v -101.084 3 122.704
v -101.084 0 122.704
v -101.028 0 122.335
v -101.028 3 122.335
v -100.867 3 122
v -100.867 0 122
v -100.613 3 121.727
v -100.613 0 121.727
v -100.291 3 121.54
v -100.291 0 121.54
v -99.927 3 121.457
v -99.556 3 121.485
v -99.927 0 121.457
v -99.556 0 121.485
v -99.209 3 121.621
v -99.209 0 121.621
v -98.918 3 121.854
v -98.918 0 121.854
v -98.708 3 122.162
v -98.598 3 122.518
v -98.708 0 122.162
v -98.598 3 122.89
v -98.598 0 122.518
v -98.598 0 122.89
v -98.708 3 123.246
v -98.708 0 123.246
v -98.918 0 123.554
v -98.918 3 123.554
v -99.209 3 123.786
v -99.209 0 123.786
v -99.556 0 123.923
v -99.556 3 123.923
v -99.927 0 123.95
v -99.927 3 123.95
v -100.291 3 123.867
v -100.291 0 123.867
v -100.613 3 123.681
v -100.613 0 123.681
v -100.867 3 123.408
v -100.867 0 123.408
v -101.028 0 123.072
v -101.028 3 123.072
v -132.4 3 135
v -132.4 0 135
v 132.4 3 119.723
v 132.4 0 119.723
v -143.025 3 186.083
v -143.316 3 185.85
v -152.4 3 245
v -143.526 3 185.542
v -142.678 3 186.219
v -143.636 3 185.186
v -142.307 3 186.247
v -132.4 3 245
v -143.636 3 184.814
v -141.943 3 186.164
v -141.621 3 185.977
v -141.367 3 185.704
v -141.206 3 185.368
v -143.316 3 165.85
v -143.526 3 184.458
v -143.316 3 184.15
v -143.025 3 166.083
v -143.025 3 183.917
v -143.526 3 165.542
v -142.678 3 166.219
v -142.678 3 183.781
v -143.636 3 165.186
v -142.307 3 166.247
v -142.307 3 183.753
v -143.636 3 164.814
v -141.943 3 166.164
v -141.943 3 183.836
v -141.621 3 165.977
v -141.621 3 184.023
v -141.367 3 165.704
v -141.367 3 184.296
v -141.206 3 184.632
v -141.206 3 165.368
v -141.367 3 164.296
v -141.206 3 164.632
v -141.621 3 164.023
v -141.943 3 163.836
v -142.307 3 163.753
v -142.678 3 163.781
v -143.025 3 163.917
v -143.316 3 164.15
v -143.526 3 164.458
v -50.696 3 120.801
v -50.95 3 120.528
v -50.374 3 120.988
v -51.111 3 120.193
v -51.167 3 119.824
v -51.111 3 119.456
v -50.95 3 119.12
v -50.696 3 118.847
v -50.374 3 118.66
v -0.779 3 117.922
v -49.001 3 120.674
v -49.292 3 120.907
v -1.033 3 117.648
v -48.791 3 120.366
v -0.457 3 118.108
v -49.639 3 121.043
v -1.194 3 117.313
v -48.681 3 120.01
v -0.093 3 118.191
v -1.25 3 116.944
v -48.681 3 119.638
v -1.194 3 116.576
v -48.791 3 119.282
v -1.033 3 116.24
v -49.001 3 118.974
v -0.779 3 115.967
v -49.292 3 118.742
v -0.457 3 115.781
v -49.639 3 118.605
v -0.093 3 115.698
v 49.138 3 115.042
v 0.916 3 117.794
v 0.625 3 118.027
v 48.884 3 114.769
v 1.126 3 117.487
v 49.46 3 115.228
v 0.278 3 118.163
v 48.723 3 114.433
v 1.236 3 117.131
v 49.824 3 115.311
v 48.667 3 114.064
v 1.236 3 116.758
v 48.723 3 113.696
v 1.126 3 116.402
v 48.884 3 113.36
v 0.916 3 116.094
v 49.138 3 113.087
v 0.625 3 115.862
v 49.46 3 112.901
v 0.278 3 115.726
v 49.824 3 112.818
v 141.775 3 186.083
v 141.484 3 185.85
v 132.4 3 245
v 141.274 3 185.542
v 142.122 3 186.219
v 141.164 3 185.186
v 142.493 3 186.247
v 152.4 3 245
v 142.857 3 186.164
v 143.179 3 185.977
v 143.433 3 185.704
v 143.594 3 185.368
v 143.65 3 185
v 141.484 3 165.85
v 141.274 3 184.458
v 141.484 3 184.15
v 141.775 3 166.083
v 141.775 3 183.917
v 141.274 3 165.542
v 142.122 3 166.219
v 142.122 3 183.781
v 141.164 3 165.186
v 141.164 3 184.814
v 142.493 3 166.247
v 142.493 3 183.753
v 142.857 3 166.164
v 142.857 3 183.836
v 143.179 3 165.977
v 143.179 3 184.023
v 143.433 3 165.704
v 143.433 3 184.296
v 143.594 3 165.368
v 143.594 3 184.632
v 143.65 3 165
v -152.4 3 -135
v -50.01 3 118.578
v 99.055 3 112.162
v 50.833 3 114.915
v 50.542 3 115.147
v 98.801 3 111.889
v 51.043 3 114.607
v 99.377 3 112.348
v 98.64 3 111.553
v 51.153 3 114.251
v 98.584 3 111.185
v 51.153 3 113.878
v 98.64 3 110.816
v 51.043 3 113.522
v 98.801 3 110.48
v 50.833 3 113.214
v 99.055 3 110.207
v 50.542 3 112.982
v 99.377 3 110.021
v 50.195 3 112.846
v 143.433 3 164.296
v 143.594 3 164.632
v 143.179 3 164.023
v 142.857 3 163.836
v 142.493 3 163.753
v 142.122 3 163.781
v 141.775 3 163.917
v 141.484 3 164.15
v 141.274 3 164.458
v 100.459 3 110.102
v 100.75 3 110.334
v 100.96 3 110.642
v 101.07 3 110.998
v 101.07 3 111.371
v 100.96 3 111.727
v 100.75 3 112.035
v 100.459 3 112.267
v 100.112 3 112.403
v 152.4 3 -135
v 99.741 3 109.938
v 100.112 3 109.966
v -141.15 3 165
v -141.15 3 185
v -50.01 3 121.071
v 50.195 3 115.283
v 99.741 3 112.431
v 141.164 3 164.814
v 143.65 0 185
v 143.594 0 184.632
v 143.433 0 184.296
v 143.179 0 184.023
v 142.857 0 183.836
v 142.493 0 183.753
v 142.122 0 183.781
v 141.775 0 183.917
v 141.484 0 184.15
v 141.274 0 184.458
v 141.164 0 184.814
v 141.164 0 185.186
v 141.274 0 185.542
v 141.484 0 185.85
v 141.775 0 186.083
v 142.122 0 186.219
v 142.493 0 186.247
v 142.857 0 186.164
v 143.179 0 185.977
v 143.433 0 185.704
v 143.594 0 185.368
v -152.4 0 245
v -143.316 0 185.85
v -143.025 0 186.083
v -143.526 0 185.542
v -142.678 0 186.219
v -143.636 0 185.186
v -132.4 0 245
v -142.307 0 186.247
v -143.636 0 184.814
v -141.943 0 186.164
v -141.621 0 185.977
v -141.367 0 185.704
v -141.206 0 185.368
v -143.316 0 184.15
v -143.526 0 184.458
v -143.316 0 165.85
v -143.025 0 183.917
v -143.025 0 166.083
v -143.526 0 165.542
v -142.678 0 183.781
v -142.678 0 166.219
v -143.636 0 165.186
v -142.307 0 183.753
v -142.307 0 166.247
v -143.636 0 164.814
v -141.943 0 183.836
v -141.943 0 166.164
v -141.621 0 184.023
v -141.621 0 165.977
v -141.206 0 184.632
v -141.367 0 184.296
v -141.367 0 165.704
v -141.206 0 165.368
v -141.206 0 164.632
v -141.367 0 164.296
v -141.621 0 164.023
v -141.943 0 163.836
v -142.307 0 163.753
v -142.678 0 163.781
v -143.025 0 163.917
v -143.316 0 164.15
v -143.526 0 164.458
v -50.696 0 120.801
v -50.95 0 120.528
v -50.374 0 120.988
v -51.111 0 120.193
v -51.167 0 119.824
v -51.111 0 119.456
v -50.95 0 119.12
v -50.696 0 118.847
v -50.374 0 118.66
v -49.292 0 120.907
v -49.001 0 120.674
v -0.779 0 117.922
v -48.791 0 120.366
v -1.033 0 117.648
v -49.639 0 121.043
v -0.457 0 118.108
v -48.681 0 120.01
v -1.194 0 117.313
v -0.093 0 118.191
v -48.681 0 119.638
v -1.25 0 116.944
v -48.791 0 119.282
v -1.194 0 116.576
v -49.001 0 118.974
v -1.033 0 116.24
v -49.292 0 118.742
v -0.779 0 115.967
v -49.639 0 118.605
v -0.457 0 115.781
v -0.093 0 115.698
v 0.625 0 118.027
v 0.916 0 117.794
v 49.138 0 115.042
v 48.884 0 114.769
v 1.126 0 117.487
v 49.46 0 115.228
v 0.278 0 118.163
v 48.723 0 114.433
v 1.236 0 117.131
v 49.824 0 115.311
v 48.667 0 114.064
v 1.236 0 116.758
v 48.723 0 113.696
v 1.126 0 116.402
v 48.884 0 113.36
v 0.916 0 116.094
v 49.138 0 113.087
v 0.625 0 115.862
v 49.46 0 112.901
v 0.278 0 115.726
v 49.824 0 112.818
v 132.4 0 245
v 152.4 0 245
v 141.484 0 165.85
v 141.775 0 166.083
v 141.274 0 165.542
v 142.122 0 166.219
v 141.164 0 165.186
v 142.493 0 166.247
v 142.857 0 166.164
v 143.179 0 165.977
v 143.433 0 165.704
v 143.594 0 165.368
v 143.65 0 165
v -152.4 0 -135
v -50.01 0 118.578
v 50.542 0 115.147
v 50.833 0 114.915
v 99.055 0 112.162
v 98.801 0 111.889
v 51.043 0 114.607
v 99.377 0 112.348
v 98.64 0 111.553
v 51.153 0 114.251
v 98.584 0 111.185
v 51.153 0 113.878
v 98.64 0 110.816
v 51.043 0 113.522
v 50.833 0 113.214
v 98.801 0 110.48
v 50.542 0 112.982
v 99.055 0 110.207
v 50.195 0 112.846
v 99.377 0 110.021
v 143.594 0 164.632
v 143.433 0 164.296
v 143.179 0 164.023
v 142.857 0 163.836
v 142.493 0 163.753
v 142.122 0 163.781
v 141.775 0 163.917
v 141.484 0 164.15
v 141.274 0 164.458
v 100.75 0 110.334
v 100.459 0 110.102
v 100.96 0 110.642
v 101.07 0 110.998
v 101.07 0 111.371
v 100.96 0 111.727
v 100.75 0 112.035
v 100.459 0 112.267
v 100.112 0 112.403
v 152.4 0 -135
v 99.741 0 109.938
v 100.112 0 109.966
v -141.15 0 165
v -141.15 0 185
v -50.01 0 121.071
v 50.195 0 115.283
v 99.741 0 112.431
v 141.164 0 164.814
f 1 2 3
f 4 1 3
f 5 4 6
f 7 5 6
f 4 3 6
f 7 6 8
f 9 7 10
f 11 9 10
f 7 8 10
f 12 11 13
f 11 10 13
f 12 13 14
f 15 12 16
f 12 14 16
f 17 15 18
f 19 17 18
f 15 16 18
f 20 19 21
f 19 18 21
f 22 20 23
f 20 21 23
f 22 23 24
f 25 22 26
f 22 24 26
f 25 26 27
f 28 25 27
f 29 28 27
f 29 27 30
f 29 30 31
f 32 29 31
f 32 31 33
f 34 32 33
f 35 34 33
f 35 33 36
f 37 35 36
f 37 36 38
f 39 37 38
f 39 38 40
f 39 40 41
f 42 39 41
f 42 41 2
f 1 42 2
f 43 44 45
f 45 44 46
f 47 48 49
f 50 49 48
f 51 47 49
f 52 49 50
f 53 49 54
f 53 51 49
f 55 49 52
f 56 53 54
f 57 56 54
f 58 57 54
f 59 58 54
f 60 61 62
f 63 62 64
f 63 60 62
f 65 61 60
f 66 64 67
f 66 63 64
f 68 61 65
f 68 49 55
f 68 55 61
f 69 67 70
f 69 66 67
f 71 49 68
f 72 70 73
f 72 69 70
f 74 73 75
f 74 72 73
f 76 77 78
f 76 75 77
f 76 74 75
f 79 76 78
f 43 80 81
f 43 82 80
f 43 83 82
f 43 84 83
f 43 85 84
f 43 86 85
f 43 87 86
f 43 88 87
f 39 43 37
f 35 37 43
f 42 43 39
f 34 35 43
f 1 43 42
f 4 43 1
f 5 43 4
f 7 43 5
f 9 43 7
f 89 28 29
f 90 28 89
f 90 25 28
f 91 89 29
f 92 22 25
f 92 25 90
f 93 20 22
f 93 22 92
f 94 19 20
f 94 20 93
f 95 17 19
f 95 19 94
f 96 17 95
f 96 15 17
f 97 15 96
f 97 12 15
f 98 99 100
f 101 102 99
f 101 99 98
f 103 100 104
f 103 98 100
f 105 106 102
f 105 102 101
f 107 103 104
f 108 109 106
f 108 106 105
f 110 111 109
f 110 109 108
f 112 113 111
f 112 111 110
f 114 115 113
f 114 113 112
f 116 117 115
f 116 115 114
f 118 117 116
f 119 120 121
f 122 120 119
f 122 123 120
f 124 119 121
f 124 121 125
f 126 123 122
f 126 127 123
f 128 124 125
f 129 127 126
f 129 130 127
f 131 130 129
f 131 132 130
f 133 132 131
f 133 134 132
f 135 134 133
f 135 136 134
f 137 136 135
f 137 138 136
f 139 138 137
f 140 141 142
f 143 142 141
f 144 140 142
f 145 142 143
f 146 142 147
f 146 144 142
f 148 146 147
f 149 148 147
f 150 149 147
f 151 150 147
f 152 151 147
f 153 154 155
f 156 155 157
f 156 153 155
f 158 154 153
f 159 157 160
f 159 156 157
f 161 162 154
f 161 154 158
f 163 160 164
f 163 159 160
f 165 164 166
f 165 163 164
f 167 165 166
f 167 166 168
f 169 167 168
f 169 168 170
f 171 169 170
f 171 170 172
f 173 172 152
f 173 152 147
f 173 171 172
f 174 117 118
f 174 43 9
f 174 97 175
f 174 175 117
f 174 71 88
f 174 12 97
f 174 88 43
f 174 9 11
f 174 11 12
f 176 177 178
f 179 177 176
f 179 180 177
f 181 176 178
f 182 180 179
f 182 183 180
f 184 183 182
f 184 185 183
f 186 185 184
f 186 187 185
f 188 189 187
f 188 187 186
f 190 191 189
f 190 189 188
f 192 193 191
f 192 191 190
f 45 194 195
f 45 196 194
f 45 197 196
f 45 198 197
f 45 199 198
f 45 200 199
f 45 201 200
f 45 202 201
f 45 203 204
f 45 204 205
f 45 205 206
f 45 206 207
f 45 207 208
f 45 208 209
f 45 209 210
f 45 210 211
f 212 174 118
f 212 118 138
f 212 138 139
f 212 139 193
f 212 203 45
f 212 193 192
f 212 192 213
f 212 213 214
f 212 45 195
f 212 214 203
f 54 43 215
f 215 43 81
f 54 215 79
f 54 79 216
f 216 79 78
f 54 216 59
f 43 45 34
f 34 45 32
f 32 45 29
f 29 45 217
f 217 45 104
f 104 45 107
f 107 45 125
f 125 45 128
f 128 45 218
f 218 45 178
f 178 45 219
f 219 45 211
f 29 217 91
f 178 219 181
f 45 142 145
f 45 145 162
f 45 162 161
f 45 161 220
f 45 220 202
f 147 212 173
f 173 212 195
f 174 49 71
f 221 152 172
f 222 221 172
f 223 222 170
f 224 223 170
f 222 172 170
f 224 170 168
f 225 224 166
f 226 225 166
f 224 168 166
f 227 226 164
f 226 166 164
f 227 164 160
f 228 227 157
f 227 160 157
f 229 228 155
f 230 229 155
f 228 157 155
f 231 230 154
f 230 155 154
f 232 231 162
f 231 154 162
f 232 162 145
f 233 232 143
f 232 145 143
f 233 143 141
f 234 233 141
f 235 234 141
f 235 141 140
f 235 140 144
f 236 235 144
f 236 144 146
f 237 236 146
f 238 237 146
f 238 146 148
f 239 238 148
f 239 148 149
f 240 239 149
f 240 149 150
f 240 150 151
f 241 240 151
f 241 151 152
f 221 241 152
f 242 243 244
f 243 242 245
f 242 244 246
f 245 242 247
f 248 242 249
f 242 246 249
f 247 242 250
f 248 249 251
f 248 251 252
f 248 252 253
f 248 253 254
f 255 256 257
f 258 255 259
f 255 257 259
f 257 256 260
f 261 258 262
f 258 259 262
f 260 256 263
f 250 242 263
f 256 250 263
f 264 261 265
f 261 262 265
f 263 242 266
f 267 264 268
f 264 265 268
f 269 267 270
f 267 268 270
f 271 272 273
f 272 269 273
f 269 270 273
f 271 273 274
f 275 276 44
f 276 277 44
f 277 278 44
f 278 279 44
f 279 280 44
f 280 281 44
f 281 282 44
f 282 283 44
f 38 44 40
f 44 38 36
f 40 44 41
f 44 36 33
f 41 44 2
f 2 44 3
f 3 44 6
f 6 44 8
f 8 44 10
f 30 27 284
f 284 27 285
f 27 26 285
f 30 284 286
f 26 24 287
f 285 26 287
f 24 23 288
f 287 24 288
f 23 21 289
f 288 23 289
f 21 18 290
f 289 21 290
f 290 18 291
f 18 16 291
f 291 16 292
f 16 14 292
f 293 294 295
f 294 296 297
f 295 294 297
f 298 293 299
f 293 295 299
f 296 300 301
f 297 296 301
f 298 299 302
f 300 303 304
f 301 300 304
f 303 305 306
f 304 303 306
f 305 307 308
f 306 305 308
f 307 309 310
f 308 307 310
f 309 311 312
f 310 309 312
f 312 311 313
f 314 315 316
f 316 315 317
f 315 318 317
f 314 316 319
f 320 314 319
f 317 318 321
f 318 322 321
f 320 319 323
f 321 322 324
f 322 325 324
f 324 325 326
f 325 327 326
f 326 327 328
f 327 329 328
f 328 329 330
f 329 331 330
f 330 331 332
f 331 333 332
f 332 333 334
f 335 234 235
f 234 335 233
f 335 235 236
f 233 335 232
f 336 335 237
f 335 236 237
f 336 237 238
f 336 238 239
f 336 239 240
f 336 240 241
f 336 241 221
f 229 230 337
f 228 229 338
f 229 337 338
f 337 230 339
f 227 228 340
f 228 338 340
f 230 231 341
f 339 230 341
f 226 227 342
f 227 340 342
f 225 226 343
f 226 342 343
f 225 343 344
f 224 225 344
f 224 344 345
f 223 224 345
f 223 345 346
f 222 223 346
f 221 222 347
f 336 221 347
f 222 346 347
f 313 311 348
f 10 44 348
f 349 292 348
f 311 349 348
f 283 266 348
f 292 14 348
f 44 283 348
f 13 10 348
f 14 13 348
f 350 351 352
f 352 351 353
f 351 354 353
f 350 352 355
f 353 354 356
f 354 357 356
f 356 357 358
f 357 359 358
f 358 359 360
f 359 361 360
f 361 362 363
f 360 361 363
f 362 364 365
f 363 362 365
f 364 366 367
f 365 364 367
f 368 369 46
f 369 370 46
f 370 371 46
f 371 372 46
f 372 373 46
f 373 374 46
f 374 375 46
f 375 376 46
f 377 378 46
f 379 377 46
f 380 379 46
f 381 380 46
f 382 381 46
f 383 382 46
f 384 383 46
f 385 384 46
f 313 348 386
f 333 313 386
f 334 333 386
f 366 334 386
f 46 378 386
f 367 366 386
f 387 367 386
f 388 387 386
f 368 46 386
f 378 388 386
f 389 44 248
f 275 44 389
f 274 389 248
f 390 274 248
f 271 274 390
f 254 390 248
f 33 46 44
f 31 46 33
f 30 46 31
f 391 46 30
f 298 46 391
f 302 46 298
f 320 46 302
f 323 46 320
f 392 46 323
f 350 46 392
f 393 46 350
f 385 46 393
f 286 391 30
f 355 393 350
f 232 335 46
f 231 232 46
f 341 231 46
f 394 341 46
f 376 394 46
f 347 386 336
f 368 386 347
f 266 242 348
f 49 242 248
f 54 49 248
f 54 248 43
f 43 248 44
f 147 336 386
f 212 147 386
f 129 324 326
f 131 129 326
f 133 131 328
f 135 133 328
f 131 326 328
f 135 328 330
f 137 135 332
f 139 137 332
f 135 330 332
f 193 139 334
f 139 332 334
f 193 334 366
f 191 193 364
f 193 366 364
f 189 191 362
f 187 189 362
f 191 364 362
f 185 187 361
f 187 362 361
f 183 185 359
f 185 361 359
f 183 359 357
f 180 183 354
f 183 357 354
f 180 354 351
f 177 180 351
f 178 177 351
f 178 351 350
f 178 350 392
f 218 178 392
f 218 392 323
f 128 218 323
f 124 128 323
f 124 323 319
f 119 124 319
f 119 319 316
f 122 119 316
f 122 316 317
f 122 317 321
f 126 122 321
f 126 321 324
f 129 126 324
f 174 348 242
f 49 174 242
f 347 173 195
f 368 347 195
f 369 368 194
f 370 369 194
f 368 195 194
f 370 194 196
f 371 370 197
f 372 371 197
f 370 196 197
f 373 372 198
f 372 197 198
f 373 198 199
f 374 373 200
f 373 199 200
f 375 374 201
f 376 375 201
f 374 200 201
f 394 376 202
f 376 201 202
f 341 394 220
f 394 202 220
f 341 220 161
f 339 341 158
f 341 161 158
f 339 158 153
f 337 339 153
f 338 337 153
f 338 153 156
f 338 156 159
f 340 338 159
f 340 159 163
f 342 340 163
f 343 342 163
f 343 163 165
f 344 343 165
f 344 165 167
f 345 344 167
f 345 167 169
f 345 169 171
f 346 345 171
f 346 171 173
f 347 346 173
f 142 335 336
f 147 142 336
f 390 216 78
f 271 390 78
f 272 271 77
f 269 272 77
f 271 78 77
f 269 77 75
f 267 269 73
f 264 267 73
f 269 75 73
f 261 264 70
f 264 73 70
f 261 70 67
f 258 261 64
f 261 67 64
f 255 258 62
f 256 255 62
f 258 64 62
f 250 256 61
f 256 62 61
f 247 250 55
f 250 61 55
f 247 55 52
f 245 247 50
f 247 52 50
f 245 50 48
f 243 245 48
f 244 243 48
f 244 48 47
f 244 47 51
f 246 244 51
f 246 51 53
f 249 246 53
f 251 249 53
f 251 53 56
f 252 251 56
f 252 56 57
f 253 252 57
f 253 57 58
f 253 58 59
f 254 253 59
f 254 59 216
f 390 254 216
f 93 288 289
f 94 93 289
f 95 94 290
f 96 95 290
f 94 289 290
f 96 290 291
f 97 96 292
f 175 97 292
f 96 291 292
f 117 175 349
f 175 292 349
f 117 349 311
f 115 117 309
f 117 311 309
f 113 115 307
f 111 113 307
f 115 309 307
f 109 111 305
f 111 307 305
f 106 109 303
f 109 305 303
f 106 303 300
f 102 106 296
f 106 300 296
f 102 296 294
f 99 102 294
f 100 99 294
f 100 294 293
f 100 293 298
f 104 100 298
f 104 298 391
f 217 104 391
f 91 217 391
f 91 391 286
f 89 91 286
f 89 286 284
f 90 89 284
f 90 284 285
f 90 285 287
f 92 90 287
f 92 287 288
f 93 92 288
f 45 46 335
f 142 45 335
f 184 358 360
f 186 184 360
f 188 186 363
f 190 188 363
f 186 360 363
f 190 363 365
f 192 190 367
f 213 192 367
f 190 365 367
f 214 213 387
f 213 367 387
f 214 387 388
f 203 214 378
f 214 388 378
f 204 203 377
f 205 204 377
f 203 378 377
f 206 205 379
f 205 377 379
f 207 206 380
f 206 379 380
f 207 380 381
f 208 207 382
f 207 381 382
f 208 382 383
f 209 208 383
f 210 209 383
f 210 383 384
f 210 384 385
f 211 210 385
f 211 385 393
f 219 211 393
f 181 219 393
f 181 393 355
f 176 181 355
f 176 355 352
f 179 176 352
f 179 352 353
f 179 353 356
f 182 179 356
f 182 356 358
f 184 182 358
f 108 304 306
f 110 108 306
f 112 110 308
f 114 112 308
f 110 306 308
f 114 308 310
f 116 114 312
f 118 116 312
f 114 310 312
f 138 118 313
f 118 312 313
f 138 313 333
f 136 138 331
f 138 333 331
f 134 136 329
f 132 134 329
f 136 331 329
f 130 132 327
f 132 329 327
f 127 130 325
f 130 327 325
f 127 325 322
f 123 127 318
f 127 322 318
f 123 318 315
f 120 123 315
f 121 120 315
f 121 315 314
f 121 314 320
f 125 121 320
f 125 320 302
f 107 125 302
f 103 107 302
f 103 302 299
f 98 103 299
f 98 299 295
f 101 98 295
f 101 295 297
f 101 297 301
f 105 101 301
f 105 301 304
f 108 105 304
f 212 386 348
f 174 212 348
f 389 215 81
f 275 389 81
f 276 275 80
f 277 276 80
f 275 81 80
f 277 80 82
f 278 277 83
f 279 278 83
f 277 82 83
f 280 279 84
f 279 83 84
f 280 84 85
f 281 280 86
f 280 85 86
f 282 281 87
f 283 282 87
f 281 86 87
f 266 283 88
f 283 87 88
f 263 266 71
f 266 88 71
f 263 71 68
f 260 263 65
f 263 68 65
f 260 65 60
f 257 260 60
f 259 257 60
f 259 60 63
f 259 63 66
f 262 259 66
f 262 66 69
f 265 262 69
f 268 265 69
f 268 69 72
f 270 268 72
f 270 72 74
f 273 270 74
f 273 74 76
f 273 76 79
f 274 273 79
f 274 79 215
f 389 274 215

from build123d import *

# Parameters (mm, degrees)
BOSS_EXTRUDE1_DEPTH               = 3
BRUSH_HOLDER_MOUNTING_HOLES_D     = 2.5
BRUSH_HOLDER_MOUNTING_HOLES_DEPTH = 7.5
BRUSH_HOLDER_MOUNTING_HOLES_TIP   = 0.751075774
OMNI_BEARING_HOLES_D              = 2.5
OMNI_BEARING_HOLES_DEPTH          = 7.5
OMNI_BEARING_HOLES_TIP            = 0.751075774


with BuildPart() as part:
    # Sketch1 → Boss-Extrude1 (new body)
    with BuildSketch(Plane(origin=(0, 0, 0), x_dir=(1, 0, 0), z_dir=(0, 1, 0))):
        Polygon((-152.4, -135), (-152.4, -245), (-132.4, -245), (-132.4, -135), (132.4, -119.723076923), (132.4, -245), (152.4, -245), (152.4, -135), (152.4, 135), (-152.4, 135), align=None)
    extrude(amount=BOSS_EXTRUDE1_DEPTH)

    # Brush Holder Mounting Holes
    with Locations(Plane(origin=(0, 3, 0), x_dir=(1, 0, 0), z_dir=(0, 1, 0))):
        with Locations((0, -116.944245147), (-49.916997084, -119.824071902), (-99.833994168, -122.703898657), (49.916997084, -114.064418392), (99.833994168, -111.184591637)):
            Hole(BRUSH_HOLDER_MOUNTING_HOLES_D / 2, depth=BRUSH_HOLDER_MOUNTING_HOLES_DEPTH)
            with Locations((0, 0, -(BRUSH_HOLDER_MOUNTING_HOLES_DEPTH + BRUSH_HOLDER_MOUNTING_HOLES_TIP / 2))):  # 118° drill point
                Cone(0, BRUSH_HOLDER_MOUNTING_HOLES_D / 2, BRUSH_HOLDER_MOUNTING_HOLES_TIP, mode=Mode.SUBTRACT)

    # Omni-Bearing Holes
    with Locations(Plane(origin=(0, 0, 0), x_dir=(-1, 0, 0), z_dir=(0, -1, 0))):
        with Locations((-142.4, -165), (-142.4, -185), (142.4, -165), (142.4, -185)):
            Hole(OMNI_BEARING_HOLES_D / 2, depth=OMNI_BEARING_HOLES_DEPTH)
            with Locations((0, 0, -(OMNI_BEARING_HOLES_DEPTH + OMNI_BEARING_HOLES_TIP / 2))):  # 118° drill point
                Cone(0, OMNI_BEARING_HOLES_D / 2, OMNI_BEARING_HOLES_TIP, mode=Mode.SUBTRACT)


solid = part.part
